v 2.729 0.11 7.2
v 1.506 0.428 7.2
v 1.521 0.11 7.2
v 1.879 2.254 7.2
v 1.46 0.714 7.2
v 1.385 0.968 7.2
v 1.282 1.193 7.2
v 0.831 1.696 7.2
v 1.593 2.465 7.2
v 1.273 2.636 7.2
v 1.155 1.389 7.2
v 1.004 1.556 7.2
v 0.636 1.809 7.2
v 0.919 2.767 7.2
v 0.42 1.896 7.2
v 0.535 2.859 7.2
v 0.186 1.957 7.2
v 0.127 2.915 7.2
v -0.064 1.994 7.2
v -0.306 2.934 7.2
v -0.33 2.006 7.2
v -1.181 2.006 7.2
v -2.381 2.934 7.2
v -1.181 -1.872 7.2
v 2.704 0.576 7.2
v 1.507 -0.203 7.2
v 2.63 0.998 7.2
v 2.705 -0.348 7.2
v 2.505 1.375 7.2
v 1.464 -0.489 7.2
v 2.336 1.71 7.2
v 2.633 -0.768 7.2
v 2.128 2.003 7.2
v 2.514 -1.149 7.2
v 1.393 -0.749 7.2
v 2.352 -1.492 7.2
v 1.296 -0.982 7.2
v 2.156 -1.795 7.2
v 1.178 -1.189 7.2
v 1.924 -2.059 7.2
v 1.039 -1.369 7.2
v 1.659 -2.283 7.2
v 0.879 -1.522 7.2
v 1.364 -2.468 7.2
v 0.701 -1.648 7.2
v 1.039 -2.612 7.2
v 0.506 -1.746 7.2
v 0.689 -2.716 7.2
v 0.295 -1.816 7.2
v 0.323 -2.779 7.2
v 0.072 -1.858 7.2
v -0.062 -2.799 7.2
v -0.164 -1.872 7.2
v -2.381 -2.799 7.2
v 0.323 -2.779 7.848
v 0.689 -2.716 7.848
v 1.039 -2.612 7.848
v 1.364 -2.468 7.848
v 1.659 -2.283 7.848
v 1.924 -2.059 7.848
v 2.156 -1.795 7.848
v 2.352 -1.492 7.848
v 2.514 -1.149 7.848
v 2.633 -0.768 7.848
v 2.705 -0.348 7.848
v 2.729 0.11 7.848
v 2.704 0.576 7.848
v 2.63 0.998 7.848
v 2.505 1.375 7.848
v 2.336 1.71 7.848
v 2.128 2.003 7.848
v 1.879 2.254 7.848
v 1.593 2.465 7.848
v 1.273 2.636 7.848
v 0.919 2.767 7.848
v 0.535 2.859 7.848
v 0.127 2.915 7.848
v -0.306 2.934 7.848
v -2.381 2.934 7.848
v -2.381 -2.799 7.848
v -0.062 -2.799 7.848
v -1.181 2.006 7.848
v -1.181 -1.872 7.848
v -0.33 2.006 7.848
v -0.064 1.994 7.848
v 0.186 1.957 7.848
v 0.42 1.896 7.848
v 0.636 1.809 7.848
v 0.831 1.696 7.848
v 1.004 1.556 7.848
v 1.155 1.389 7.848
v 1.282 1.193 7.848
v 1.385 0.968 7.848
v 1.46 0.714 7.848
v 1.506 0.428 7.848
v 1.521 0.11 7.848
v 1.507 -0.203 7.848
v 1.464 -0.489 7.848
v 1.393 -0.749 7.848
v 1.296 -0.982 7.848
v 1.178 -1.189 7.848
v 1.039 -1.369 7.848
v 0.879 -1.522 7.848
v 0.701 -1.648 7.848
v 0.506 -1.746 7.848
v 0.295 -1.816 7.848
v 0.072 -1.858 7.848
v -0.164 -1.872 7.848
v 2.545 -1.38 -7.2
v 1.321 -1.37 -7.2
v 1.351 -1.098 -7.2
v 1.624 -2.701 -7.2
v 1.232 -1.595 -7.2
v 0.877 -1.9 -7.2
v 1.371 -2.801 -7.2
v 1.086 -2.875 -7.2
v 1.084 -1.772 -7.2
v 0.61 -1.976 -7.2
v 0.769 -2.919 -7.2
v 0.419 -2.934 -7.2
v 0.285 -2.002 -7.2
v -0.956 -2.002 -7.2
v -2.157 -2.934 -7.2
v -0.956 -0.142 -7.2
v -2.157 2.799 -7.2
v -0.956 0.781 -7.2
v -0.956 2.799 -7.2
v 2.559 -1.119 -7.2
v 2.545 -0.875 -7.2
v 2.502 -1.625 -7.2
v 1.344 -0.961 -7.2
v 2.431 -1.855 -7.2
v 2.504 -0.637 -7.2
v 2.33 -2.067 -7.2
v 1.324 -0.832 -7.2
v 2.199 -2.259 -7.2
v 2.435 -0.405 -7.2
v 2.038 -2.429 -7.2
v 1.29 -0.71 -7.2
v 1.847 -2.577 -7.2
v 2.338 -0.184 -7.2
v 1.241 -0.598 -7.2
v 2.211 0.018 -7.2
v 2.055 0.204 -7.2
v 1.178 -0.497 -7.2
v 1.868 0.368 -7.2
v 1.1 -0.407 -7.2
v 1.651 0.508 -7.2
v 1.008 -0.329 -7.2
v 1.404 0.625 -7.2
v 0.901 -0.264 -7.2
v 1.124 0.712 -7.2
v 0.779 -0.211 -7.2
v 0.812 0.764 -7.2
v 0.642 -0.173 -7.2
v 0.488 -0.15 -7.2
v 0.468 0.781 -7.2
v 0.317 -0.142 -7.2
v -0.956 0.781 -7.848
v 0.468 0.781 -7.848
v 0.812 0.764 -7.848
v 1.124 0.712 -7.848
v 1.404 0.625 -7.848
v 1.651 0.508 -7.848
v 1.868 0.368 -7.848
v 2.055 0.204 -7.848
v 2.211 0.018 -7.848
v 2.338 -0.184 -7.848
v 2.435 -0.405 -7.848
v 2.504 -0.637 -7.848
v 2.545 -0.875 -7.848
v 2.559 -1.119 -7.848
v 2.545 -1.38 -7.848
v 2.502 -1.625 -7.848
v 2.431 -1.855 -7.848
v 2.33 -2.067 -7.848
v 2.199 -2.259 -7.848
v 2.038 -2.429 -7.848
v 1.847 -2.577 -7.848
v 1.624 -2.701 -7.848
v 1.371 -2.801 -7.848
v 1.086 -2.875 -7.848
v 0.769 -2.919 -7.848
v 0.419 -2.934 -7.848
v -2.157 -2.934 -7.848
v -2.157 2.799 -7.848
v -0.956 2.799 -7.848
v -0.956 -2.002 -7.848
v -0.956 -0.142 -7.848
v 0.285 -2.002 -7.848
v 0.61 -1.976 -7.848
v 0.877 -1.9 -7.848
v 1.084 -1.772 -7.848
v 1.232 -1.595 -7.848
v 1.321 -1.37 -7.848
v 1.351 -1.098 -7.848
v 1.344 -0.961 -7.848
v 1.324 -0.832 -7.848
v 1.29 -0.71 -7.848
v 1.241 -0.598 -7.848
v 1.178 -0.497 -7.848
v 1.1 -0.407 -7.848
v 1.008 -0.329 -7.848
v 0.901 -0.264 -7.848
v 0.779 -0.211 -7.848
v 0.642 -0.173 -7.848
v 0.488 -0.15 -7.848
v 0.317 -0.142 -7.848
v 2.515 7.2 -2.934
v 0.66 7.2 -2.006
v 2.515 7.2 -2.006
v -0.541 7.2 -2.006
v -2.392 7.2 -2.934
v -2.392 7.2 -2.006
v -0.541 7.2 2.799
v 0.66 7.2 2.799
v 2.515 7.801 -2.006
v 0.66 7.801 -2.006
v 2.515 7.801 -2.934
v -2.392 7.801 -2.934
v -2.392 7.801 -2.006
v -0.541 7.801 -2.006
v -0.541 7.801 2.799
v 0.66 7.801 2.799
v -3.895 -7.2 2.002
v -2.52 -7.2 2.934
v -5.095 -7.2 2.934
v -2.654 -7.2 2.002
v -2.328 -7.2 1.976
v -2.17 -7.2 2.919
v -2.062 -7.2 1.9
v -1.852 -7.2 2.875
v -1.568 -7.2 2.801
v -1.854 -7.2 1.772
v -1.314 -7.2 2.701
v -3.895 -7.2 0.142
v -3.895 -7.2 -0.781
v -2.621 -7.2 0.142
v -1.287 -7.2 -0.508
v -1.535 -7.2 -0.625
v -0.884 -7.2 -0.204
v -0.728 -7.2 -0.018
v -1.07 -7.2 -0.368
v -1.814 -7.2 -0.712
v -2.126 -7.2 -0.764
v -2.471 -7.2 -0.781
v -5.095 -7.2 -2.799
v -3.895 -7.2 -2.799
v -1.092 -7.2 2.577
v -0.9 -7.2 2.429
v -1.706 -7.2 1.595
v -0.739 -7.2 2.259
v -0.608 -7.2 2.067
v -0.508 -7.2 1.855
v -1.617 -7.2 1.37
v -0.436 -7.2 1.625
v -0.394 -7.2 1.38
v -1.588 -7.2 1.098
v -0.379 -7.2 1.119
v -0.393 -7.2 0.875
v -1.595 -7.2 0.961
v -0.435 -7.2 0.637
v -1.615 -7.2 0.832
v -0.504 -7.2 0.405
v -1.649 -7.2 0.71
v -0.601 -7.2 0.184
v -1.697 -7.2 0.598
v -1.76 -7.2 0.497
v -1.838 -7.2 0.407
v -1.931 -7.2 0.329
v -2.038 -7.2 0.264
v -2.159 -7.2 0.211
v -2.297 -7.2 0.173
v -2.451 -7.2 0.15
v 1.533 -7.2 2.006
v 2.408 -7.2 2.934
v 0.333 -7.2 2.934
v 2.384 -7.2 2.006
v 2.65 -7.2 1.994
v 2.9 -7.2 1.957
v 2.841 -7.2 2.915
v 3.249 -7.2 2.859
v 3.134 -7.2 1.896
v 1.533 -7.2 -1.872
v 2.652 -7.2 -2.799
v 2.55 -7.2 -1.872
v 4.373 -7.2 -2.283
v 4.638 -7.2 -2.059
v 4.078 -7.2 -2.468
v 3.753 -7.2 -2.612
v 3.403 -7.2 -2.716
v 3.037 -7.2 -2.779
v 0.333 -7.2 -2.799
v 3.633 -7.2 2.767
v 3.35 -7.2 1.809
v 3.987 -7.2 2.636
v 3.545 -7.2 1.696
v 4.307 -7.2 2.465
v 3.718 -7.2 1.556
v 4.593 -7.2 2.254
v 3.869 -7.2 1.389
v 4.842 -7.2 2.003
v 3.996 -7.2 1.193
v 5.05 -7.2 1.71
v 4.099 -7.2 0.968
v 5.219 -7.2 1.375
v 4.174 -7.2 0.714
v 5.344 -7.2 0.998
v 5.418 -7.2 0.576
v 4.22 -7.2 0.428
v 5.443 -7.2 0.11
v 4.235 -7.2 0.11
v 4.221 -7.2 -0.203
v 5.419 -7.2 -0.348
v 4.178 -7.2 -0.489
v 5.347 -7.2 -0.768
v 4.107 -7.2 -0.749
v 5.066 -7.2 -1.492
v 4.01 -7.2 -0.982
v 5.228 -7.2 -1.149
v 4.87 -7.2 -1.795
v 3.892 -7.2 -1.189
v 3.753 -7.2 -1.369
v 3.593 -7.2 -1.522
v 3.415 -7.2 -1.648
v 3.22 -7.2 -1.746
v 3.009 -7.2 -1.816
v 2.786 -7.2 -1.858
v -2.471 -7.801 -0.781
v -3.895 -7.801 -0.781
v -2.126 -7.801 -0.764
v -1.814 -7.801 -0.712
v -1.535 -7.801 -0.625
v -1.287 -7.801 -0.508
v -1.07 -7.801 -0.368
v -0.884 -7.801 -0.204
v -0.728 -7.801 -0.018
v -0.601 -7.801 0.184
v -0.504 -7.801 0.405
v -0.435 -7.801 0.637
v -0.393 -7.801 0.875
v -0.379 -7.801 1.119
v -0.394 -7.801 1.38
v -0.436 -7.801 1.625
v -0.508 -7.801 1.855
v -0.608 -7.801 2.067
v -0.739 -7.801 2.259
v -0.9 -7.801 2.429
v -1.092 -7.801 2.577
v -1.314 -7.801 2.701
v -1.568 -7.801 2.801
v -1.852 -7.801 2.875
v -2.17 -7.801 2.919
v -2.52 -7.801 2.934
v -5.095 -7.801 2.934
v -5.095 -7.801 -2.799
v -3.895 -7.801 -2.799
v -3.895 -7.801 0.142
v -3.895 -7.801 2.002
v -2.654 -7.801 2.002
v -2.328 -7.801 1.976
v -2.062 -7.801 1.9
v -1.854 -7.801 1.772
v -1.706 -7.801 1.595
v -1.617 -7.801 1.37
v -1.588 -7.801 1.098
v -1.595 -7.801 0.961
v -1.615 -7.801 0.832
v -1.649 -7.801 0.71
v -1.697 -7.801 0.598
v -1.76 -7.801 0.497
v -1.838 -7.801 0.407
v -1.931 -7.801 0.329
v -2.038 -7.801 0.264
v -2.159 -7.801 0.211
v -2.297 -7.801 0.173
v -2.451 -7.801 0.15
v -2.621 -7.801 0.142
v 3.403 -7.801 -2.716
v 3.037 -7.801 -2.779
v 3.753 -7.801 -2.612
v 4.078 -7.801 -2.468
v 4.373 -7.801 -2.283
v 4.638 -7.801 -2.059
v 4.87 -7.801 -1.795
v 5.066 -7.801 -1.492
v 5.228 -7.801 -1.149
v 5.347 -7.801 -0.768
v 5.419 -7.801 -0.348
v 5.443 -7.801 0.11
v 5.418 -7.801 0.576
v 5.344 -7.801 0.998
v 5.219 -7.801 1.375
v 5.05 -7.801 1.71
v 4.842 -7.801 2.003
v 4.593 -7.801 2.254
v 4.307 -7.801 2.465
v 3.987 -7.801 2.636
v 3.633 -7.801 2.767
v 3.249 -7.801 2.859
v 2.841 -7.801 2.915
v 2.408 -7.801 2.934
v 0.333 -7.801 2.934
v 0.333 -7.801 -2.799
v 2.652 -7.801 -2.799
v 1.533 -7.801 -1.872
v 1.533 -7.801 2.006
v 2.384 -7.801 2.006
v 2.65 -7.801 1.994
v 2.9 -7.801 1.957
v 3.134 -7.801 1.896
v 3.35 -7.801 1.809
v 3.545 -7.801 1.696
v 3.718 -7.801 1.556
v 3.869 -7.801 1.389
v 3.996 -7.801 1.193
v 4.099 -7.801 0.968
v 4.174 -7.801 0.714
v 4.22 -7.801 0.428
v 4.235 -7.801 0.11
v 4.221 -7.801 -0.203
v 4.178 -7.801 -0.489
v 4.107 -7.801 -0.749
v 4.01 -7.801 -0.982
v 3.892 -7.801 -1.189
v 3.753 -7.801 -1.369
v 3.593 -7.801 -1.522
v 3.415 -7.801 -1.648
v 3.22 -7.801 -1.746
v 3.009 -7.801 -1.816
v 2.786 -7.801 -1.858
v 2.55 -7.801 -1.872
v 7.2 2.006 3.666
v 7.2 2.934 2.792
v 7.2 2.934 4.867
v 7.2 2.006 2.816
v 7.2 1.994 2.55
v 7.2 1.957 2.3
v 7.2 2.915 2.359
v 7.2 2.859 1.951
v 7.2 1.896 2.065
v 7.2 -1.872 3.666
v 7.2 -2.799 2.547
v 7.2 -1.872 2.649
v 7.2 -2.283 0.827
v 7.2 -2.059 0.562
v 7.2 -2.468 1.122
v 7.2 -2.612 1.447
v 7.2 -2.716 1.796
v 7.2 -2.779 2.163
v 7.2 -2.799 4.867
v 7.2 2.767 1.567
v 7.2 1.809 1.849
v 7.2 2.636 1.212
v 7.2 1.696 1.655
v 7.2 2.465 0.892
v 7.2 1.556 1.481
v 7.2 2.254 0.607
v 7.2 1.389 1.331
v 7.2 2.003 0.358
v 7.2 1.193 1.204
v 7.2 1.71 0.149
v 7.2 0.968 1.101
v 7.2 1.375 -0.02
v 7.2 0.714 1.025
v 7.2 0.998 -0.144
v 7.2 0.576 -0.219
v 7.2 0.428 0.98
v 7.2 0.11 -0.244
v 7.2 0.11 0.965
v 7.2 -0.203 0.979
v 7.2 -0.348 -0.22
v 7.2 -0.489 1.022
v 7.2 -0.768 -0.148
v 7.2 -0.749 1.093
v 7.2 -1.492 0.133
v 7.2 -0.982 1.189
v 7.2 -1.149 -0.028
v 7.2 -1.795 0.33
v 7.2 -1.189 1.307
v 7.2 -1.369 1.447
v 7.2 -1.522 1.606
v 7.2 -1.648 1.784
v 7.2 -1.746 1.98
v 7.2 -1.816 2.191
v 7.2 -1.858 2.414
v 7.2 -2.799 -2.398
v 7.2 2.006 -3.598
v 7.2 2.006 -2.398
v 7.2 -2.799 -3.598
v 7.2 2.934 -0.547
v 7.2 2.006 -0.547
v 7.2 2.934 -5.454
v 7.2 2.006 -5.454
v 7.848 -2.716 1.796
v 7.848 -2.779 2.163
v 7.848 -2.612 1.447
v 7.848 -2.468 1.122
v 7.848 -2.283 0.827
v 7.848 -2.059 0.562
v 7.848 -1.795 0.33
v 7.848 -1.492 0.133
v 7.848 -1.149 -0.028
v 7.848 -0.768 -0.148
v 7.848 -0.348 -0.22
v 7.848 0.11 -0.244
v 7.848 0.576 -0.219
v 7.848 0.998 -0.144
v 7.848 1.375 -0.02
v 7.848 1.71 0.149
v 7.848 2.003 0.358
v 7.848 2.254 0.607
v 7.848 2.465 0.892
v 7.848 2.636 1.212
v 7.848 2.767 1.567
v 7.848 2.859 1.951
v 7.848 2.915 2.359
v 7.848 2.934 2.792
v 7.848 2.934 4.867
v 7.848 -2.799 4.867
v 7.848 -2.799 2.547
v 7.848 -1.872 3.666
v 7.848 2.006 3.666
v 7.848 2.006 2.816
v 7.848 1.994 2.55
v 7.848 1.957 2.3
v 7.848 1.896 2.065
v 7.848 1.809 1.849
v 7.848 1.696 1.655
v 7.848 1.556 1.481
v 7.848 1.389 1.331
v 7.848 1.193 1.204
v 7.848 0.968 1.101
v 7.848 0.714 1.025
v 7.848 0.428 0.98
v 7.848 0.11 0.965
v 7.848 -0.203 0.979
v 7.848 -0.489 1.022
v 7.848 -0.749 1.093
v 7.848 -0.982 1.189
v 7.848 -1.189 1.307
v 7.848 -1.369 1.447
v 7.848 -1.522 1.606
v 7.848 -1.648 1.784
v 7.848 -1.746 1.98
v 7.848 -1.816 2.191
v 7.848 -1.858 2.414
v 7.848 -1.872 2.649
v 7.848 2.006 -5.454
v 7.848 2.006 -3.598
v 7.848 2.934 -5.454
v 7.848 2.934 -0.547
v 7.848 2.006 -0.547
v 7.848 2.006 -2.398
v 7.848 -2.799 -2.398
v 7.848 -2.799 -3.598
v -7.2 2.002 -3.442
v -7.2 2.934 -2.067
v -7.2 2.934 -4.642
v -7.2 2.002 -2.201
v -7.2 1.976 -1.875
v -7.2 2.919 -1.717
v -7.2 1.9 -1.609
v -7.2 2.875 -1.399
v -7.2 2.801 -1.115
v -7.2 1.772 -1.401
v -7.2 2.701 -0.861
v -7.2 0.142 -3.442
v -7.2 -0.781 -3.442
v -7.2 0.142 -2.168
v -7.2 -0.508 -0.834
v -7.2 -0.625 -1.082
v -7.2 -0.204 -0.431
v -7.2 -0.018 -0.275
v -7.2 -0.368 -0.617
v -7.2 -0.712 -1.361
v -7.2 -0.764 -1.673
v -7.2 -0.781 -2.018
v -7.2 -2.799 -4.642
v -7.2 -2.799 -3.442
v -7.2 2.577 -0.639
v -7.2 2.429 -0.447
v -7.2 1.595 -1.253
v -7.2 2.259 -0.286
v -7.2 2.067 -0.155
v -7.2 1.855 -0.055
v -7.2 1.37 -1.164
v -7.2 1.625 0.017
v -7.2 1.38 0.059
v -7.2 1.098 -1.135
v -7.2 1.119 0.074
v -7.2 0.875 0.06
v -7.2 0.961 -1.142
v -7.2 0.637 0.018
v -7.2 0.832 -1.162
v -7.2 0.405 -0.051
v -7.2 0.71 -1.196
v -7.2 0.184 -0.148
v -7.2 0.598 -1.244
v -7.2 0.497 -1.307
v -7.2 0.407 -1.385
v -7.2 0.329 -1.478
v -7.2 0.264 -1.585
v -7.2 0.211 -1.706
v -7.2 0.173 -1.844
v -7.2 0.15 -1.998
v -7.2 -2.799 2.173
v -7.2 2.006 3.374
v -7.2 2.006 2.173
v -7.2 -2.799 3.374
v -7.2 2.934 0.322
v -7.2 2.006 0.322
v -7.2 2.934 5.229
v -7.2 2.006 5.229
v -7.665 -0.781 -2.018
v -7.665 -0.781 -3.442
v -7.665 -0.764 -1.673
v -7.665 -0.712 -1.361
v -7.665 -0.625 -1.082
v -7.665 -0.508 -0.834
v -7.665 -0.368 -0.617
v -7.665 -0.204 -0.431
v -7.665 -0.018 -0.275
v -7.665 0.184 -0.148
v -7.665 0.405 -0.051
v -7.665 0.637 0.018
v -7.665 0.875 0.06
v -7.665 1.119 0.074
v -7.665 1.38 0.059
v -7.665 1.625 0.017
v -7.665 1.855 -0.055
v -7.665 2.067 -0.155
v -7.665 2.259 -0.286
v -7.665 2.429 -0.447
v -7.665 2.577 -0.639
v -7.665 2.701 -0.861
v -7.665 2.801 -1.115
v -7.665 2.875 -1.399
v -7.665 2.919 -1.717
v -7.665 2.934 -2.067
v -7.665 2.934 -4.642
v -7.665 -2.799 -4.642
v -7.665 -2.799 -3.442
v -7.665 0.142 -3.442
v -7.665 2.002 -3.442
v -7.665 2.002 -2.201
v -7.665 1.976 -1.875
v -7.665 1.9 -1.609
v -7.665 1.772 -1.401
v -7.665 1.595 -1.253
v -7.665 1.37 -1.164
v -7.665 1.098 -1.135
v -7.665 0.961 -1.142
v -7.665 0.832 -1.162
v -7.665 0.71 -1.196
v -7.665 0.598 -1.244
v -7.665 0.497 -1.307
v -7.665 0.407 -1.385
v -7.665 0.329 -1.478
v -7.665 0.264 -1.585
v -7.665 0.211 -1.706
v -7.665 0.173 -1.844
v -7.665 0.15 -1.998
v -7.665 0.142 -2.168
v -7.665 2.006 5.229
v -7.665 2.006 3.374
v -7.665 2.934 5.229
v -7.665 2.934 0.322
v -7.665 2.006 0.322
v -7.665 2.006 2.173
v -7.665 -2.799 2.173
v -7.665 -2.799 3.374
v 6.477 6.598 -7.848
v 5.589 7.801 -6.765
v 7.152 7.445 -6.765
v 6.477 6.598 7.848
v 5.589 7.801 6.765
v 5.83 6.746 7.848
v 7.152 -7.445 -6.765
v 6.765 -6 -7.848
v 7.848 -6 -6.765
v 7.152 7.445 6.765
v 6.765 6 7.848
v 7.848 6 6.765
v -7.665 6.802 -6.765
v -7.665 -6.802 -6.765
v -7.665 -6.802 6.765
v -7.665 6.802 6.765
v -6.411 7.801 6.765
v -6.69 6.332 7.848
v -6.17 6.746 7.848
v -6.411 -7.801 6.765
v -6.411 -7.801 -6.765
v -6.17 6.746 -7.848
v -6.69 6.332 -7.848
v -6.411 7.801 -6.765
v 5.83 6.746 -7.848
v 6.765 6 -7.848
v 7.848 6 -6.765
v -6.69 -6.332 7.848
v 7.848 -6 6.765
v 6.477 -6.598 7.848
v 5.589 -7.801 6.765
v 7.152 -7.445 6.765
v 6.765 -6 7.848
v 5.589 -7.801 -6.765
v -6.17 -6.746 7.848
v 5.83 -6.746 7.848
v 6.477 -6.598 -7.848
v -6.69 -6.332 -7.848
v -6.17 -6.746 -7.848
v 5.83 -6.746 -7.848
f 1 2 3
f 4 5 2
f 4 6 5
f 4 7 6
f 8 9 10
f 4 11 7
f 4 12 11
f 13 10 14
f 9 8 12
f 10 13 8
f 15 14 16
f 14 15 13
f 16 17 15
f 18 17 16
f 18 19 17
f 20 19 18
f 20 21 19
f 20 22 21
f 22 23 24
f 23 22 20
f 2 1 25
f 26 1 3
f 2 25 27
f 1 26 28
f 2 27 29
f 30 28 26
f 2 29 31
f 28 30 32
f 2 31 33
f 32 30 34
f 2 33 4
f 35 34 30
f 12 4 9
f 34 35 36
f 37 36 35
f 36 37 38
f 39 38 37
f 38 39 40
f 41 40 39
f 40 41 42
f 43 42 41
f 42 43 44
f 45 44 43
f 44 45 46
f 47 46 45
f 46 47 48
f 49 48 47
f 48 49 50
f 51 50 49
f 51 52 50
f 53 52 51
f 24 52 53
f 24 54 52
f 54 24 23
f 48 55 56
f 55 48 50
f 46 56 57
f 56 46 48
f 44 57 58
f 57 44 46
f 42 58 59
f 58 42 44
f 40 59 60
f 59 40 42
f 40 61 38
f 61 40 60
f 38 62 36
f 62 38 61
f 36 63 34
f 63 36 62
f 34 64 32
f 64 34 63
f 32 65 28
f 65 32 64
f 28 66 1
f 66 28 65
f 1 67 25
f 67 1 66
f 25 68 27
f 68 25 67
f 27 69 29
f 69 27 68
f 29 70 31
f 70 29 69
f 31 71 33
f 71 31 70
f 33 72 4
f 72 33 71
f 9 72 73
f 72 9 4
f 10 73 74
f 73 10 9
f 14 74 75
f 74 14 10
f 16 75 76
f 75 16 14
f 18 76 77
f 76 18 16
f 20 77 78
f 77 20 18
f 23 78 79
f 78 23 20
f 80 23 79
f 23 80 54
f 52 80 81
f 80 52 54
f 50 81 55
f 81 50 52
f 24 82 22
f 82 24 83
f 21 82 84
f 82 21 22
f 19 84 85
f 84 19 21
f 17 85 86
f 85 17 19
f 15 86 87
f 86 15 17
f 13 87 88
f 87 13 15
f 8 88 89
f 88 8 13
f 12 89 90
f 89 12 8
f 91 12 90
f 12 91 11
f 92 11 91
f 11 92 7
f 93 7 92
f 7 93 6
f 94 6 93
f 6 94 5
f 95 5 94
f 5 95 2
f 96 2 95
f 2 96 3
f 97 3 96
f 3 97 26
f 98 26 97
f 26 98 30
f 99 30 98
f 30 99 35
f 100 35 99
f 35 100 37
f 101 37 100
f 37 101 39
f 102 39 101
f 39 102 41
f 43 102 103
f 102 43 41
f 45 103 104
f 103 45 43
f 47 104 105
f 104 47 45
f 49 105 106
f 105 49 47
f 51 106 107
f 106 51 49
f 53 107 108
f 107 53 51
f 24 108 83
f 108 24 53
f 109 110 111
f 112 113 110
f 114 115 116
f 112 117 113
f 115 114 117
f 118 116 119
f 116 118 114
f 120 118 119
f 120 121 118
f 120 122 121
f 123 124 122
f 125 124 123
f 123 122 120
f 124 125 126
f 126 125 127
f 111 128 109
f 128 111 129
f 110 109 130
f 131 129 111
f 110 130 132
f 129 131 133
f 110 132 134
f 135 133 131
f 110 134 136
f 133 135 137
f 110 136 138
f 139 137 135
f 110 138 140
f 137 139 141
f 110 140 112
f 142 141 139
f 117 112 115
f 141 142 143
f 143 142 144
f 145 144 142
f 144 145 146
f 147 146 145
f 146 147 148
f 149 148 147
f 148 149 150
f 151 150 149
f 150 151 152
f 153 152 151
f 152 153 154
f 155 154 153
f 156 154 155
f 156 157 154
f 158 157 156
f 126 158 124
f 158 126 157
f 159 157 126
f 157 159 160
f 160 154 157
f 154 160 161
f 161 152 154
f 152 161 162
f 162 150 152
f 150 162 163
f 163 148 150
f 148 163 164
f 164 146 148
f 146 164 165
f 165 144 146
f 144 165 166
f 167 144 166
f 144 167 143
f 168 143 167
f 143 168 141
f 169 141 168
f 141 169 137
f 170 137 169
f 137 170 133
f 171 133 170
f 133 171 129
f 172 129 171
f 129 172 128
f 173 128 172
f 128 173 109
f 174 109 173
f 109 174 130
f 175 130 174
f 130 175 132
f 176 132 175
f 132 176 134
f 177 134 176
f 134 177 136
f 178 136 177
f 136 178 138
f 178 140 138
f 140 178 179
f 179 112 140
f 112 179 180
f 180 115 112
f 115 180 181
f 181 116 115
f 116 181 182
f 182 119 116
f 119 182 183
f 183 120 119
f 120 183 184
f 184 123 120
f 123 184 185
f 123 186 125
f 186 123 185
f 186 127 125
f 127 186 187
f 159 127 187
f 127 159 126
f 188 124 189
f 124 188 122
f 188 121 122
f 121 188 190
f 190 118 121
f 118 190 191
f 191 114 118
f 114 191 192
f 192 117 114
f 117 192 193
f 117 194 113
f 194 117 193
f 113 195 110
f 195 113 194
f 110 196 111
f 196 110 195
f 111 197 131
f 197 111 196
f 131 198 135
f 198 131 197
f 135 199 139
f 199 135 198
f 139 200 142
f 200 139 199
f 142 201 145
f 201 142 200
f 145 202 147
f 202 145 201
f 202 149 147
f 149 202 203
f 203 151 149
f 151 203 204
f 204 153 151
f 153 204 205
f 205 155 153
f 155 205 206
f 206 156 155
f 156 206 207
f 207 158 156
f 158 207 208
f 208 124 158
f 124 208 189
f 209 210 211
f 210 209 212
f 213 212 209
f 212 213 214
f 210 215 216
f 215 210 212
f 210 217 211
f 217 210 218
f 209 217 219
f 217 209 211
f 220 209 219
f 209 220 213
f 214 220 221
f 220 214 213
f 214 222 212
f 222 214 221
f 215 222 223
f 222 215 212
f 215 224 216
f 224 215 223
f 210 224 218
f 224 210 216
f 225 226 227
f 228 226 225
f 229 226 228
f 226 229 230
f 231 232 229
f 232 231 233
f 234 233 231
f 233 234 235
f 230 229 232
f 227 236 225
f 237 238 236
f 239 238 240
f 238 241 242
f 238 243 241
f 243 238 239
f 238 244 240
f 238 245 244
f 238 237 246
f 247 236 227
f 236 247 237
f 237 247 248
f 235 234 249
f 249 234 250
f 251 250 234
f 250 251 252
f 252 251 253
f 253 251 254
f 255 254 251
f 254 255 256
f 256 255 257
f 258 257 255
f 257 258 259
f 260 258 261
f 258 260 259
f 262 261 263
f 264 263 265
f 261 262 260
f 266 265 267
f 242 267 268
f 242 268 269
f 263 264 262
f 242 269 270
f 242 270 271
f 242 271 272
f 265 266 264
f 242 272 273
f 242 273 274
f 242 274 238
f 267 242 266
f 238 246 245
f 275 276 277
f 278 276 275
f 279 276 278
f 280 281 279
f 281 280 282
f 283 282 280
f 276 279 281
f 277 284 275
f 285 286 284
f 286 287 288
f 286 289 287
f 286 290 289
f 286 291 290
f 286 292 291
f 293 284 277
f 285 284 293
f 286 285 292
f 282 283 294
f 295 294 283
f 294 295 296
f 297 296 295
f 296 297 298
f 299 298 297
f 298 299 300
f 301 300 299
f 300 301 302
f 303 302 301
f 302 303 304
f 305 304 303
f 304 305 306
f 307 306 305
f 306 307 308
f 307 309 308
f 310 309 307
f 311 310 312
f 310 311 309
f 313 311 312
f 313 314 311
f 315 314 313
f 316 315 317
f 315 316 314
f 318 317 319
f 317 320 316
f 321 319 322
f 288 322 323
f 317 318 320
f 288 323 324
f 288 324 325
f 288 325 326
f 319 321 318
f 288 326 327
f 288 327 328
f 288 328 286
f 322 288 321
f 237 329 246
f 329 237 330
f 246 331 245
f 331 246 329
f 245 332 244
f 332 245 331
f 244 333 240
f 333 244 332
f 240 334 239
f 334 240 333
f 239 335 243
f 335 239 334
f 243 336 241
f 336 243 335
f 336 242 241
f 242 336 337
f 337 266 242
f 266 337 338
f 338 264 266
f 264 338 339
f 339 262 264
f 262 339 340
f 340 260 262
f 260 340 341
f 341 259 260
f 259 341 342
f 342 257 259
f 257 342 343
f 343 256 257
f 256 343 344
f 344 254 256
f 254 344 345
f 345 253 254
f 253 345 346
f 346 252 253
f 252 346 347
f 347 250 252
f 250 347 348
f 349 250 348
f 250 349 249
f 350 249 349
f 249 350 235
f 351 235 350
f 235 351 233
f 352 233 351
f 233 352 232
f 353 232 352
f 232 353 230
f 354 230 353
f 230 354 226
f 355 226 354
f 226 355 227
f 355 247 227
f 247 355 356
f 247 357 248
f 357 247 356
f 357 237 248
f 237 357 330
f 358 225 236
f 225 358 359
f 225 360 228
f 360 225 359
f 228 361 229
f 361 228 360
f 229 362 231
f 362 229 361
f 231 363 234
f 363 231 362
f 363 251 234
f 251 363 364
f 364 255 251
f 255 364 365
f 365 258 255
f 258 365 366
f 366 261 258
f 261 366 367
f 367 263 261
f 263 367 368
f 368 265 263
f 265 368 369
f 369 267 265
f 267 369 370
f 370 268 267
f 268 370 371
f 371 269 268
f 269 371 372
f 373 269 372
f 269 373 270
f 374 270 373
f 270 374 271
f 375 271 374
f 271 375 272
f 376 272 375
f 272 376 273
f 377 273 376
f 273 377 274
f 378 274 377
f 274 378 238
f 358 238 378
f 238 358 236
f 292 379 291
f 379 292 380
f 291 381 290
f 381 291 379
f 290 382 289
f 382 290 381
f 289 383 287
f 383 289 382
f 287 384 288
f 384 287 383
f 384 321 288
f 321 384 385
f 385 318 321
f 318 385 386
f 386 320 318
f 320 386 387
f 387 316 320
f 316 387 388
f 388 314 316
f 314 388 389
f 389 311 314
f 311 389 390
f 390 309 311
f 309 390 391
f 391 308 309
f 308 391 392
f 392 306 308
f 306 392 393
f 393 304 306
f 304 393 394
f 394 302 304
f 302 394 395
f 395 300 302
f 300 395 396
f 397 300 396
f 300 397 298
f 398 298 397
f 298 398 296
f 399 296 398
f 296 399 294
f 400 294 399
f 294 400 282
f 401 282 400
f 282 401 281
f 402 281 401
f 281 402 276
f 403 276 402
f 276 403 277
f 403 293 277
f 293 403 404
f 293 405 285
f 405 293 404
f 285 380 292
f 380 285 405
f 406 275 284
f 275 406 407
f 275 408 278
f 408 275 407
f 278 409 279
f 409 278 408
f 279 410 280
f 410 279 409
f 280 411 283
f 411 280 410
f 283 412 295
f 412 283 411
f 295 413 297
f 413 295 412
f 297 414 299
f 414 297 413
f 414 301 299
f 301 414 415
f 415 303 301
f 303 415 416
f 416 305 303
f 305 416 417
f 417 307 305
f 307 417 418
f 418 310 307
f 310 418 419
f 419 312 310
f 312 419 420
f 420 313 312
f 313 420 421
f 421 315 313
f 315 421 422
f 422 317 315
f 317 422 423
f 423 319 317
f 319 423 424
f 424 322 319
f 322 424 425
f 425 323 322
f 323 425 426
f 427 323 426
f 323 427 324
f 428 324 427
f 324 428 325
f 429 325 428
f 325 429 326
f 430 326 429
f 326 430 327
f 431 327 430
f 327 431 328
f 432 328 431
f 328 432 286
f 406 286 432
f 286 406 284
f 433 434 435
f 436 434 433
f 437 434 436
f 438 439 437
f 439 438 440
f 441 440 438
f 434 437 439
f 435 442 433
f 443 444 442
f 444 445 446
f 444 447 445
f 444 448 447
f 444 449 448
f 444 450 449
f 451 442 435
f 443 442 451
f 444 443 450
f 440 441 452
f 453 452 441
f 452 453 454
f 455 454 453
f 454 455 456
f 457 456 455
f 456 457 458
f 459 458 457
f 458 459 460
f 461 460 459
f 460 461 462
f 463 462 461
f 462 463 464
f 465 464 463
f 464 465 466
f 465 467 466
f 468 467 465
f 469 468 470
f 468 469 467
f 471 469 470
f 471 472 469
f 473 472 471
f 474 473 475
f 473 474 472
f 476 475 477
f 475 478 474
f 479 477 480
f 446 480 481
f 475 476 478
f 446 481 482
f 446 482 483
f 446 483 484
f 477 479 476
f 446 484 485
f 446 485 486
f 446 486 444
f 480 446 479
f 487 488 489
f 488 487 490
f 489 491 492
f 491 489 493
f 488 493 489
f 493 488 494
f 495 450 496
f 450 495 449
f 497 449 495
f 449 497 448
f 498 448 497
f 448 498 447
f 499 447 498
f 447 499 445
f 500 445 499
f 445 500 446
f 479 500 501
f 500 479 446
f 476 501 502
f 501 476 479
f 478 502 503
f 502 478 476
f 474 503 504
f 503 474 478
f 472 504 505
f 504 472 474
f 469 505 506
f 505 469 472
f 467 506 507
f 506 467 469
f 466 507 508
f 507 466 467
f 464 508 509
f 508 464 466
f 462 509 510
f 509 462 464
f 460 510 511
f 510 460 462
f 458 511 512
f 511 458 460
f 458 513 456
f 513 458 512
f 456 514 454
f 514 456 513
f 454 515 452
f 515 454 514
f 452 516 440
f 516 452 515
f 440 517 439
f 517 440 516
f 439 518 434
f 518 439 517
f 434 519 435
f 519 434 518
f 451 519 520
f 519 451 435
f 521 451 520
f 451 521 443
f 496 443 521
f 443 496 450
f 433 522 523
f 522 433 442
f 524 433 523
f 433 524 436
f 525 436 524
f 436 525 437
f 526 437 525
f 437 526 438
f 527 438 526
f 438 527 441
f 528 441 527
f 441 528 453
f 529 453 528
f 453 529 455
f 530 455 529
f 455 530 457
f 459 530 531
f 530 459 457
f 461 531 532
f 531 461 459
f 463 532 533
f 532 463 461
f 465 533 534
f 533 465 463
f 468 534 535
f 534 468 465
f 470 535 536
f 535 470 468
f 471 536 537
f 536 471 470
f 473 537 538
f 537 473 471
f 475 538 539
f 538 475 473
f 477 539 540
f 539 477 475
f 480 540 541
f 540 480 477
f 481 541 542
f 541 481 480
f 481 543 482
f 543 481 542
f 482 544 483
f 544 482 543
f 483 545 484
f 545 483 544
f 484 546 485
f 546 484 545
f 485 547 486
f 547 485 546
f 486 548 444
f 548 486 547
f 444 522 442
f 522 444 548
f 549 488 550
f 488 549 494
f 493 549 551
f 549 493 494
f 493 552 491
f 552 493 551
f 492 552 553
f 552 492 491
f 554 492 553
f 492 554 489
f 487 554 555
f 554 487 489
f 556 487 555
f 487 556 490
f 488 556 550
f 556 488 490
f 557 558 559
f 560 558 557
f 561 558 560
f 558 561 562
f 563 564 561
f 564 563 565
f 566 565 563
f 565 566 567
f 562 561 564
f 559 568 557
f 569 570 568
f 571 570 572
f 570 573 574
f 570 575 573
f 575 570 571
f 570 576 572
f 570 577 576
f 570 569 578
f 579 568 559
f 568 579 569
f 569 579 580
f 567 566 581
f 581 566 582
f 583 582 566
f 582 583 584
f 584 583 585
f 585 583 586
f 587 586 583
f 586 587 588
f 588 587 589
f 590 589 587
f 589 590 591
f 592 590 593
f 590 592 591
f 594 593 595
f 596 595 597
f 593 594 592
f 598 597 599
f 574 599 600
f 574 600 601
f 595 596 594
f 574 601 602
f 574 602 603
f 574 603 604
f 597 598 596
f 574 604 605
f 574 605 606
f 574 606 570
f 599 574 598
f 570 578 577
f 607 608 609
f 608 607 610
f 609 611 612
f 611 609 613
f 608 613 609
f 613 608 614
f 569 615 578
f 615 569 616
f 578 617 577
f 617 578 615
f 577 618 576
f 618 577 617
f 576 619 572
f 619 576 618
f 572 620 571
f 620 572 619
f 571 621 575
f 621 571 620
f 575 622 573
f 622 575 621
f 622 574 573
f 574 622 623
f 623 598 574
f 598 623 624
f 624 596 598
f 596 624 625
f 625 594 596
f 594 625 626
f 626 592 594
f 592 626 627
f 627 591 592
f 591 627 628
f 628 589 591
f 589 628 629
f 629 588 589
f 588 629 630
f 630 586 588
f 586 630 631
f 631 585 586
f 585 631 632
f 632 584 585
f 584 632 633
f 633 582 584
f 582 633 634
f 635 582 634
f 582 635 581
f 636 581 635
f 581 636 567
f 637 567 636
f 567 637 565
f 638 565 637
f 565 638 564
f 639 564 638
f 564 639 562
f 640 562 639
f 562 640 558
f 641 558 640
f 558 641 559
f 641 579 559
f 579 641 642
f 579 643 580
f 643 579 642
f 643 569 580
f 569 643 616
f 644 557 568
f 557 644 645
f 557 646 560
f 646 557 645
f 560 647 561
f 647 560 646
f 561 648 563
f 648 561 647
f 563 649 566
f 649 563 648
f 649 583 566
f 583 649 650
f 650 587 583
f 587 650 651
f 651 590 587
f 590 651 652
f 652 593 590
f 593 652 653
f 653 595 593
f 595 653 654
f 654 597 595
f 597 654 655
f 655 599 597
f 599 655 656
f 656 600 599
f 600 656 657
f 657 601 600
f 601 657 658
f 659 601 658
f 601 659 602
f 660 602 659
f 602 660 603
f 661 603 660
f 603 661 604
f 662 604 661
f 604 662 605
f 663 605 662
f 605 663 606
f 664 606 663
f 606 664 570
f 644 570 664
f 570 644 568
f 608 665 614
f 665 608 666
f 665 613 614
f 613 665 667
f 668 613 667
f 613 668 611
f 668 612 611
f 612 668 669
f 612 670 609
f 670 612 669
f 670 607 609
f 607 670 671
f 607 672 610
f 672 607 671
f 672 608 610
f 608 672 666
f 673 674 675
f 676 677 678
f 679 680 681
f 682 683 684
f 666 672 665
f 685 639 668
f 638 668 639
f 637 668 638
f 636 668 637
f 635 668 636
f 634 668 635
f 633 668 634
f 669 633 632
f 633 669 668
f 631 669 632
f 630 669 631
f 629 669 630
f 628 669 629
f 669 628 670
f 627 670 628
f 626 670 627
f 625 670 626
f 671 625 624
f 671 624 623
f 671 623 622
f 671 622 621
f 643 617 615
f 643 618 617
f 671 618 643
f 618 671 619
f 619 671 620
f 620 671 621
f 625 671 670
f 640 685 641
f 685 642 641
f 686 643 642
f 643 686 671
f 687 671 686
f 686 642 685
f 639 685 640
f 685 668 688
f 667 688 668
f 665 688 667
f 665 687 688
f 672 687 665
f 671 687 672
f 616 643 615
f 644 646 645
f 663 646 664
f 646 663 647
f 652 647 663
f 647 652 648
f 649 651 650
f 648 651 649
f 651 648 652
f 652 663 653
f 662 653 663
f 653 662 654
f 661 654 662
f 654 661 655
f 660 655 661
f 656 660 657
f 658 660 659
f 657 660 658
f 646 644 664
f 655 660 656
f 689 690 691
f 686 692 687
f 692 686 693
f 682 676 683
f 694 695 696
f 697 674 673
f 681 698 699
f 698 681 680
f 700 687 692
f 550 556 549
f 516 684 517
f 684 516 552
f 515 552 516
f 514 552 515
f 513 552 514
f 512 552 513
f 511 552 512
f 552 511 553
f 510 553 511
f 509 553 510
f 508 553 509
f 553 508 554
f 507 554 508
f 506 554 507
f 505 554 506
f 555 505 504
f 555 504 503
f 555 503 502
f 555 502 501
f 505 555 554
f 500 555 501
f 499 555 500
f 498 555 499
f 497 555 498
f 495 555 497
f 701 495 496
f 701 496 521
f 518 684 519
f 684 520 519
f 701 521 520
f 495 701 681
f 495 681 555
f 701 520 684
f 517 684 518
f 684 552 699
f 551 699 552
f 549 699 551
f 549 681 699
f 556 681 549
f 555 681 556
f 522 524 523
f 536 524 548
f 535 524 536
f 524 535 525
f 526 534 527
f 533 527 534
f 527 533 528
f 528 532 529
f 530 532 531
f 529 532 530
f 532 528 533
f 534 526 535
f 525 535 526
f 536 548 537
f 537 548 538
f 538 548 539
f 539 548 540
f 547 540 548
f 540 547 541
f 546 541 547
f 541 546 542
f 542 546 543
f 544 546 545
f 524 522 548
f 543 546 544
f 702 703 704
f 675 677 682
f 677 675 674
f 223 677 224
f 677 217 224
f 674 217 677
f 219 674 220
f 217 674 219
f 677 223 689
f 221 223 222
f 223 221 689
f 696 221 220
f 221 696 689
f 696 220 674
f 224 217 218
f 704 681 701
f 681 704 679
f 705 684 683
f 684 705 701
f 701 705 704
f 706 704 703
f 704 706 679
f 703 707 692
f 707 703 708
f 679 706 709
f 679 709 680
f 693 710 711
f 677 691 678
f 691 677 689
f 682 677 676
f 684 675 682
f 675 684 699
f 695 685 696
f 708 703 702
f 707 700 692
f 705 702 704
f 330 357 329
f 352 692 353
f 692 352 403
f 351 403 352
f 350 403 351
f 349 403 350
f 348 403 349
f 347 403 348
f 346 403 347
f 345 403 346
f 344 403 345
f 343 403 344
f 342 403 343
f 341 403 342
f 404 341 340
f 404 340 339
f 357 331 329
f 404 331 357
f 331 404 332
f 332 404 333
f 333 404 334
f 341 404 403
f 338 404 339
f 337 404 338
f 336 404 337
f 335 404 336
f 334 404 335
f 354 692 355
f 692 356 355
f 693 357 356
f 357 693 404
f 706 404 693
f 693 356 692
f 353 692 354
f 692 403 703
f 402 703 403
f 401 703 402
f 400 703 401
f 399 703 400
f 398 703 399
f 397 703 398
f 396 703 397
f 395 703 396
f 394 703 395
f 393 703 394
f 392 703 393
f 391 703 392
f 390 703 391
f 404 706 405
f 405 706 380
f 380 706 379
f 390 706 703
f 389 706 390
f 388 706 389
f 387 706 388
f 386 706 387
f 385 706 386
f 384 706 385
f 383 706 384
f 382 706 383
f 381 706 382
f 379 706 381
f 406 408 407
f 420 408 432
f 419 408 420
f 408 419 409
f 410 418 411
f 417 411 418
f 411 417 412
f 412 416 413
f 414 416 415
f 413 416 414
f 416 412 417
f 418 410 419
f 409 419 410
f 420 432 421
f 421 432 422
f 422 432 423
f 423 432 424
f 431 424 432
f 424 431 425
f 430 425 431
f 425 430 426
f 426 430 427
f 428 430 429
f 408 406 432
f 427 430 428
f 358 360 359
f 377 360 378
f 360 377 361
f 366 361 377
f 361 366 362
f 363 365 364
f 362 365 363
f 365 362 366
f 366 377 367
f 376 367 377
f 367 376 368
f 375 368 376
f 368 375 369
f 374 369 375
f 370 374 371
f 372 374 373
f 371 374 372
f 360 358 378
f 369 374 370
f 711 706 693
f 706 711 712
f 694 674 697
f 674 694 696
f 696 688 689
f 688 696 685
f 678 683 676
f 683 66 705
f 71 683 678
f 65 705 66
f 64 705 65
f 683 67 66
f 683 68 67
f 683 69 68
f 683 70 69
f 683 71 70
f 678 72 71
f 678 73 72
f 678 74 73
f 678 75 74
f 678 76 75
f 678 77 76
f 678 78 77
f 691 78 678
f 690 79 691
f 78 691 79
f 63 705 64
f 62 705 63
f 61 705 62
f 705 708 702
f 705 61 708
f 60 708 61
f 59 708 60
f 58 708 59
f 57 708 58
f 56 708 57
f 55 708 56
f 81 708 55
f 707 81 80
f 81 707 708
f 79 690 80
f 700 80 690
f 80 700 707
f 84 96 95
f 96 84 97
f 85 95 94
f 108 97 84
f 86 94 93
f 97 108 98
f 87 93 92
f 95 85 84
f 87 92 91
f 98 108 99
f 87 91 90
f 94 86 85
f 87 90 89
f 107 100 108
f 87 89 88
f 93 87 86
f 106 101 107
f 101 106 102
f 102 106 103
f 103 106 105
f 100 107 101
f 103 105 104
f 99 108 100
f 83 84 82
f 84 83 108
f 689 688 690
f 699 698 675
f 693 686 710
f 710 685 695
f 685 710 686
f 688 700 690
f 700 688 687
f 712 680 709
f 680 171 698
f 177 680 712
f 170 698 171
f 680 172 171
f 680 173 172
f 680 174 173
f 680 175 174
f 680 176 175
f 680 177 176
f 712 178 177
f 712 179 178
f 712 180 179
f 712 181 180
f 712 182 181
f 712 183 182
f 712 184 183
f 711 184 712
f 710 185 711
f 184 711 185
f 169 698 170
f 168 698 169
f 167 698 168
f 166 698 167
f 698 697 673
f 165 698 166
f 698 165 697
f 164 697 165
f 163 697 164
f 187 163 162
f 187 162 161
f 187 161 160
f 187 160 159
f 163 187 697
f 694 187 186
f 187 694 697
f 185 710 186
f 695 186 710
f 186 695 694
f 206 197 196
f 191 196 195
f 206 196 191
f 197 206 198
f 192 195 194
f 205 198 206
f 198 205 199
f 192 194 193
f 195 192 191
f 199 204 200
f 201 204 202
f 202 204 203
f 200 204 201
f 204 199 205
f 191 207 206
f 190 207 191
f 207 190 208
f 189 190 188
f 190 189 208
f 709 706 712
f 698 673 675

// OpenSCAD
 // Spielwürfel D P T PD DT PT
size = 16;
r = 2;
text_depth = 0.8;
font_size = 6;

module face(txt) {
    linear_extrude(height = text_depth)
        text(txt, size = font_size, font = "Arial:style=Bold", halign="center", valign="center");
}

module die() {
    difference() {
        minkowski() {
            cube([size-2*r, size-2*r, size-2*r], center=true);
            sphere(r);
        }

        // Gravuren auf allen Seiten
        for (side = [
            ["D", [0, 0, size/2], [0,0,0]],
            ["P", [0, 0, -size/2], [180,0,0]],
            ["T", [0, size/2, 0], [-90,0,0]],
            ["PD", [0, -size/2, 0], [90,0,0]],
            ["DT", [size/2, 0, 0], [0,90,0]],
            ["PT", [-size/2, 0, 0], [0,-90,0]]
        ]) {
            translate(side[1])
                rotate(side[2])
                    translate([0,0,-text_depth])
                        face(side[0]);
        }
    }
}

die();
